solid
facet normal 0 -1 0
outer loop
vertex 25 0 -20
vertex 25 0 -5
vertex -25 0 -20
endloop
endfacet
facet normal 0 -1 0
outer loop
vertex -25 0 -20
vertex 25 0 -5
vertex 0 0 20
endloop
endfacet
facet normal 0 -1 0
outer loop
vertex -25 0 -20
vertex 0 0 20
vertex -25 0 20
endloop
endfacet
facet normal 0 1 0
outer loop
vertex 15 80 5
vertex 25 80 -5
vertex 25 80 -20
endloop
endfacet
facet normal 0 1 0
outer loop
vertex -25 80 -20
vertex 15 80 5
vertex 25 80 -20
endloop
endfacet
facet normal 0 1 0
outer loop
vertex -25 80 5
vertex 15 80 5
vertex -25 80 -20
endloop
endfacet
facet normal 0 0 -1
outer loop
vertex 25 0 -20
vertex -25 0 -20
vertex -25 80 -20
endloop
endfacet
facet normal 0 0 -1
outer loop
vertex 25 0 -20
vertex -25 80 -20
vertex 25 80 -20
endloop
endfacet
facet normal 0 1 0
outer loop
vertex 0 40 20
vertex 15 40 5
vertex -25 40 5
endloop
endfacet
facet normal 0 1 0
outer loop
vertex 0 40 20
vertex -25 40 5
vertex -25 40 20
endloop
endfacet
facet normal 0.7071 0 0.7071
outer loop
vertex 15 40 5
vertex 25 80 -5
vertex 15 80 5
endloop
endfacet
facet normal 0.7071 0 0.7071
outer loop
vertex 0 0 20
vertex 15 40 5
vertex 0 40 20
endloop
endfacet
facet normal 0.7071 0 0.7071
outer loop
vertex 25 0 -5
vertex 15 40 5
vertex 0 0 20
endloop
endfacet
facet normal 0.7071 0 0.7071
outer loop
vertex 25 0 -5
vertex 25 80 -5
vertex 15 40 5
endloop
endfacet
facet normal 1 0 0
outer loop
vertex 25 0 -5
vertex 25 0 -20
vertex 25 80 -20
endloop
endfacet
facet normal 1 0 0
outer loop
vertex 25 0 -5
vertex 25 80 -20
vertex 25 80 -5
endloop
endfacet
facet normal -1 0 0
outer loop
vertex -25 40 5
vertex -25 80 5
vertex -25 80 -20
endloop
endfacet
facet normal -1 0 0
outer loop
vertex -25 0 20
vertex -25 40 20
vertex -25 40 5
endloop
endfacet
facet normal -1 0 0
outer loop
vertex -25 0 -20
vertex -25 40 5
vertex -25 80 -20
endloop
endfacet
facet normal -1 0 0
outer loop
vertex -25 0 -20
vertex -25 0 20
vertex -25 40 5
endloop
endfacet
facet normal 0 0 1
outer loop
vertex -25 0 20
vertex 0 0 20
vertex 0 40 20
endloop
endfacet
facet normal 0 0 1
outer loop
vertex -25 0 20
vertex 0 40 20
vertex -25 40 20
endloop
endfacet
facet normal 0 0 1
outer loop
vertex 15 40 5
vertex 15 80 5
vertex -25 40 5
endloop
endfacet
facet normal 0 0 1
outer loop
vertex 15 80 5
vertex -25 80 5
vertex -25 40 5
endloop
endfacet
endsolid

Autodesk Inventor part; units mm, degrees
ref_plane "YZ Plane" through (0, 0, 0) normal (1, 0, 0) x (0, 1, 0)
ref_plane "XZ Plane" through (0, 0, 0) normal (0, 1, 0) x (-1, 0, 0)
ref_plane "XY Plane" through (0, 0, 0) normal (0, 0, 1) x (1, 0, 0)
sketch "Esboço1" plane through (0, 0, 0) normal (0, 1, 0) x (-1, 0, 0)
  line L0 (-25, 20) -> (25, 20)
  line L1 (25, 20) -> (25, -20)
  line L2 (25, -20) -> (-25, -20)
  line L3 (-25, -20) -> (-25, 20)
  line L4 (-25, 20) -> (25, -20) construction
  line L5 (25, 20) -> (-25, -20) construction
  point P0 (0, 0)
  dimension "d0" = 50
  dimension "d1" = 40
extrude "Extrusão1" add sketch "Esboço1" along normal blind 80
chamfer "Chanfro1" distance 25 angle 45 1 edges at (25, 40, 20) measured on face at (-8.3333, 26.6667, 20)
sketch "Esboço2" plane through (-25, 0, -20) normal (-1, 0, 0) x (0, 0, 1)
  line L0 (0, 80) -> (40, 80) projected
  line L1 (40, 80) -> (25, 80)
  line L2 (25, 80) -> (25, 40)
  line L3 (25, 40) -> (40, 40)
  line L4 (40, 40) -> (40, 80)
  point P0 (20, 0)
  dimension "d7" = 15
  dimension "d8" = 40
extrude "Extrusão2" cut sketch "Esboço2" against normal blind 80
